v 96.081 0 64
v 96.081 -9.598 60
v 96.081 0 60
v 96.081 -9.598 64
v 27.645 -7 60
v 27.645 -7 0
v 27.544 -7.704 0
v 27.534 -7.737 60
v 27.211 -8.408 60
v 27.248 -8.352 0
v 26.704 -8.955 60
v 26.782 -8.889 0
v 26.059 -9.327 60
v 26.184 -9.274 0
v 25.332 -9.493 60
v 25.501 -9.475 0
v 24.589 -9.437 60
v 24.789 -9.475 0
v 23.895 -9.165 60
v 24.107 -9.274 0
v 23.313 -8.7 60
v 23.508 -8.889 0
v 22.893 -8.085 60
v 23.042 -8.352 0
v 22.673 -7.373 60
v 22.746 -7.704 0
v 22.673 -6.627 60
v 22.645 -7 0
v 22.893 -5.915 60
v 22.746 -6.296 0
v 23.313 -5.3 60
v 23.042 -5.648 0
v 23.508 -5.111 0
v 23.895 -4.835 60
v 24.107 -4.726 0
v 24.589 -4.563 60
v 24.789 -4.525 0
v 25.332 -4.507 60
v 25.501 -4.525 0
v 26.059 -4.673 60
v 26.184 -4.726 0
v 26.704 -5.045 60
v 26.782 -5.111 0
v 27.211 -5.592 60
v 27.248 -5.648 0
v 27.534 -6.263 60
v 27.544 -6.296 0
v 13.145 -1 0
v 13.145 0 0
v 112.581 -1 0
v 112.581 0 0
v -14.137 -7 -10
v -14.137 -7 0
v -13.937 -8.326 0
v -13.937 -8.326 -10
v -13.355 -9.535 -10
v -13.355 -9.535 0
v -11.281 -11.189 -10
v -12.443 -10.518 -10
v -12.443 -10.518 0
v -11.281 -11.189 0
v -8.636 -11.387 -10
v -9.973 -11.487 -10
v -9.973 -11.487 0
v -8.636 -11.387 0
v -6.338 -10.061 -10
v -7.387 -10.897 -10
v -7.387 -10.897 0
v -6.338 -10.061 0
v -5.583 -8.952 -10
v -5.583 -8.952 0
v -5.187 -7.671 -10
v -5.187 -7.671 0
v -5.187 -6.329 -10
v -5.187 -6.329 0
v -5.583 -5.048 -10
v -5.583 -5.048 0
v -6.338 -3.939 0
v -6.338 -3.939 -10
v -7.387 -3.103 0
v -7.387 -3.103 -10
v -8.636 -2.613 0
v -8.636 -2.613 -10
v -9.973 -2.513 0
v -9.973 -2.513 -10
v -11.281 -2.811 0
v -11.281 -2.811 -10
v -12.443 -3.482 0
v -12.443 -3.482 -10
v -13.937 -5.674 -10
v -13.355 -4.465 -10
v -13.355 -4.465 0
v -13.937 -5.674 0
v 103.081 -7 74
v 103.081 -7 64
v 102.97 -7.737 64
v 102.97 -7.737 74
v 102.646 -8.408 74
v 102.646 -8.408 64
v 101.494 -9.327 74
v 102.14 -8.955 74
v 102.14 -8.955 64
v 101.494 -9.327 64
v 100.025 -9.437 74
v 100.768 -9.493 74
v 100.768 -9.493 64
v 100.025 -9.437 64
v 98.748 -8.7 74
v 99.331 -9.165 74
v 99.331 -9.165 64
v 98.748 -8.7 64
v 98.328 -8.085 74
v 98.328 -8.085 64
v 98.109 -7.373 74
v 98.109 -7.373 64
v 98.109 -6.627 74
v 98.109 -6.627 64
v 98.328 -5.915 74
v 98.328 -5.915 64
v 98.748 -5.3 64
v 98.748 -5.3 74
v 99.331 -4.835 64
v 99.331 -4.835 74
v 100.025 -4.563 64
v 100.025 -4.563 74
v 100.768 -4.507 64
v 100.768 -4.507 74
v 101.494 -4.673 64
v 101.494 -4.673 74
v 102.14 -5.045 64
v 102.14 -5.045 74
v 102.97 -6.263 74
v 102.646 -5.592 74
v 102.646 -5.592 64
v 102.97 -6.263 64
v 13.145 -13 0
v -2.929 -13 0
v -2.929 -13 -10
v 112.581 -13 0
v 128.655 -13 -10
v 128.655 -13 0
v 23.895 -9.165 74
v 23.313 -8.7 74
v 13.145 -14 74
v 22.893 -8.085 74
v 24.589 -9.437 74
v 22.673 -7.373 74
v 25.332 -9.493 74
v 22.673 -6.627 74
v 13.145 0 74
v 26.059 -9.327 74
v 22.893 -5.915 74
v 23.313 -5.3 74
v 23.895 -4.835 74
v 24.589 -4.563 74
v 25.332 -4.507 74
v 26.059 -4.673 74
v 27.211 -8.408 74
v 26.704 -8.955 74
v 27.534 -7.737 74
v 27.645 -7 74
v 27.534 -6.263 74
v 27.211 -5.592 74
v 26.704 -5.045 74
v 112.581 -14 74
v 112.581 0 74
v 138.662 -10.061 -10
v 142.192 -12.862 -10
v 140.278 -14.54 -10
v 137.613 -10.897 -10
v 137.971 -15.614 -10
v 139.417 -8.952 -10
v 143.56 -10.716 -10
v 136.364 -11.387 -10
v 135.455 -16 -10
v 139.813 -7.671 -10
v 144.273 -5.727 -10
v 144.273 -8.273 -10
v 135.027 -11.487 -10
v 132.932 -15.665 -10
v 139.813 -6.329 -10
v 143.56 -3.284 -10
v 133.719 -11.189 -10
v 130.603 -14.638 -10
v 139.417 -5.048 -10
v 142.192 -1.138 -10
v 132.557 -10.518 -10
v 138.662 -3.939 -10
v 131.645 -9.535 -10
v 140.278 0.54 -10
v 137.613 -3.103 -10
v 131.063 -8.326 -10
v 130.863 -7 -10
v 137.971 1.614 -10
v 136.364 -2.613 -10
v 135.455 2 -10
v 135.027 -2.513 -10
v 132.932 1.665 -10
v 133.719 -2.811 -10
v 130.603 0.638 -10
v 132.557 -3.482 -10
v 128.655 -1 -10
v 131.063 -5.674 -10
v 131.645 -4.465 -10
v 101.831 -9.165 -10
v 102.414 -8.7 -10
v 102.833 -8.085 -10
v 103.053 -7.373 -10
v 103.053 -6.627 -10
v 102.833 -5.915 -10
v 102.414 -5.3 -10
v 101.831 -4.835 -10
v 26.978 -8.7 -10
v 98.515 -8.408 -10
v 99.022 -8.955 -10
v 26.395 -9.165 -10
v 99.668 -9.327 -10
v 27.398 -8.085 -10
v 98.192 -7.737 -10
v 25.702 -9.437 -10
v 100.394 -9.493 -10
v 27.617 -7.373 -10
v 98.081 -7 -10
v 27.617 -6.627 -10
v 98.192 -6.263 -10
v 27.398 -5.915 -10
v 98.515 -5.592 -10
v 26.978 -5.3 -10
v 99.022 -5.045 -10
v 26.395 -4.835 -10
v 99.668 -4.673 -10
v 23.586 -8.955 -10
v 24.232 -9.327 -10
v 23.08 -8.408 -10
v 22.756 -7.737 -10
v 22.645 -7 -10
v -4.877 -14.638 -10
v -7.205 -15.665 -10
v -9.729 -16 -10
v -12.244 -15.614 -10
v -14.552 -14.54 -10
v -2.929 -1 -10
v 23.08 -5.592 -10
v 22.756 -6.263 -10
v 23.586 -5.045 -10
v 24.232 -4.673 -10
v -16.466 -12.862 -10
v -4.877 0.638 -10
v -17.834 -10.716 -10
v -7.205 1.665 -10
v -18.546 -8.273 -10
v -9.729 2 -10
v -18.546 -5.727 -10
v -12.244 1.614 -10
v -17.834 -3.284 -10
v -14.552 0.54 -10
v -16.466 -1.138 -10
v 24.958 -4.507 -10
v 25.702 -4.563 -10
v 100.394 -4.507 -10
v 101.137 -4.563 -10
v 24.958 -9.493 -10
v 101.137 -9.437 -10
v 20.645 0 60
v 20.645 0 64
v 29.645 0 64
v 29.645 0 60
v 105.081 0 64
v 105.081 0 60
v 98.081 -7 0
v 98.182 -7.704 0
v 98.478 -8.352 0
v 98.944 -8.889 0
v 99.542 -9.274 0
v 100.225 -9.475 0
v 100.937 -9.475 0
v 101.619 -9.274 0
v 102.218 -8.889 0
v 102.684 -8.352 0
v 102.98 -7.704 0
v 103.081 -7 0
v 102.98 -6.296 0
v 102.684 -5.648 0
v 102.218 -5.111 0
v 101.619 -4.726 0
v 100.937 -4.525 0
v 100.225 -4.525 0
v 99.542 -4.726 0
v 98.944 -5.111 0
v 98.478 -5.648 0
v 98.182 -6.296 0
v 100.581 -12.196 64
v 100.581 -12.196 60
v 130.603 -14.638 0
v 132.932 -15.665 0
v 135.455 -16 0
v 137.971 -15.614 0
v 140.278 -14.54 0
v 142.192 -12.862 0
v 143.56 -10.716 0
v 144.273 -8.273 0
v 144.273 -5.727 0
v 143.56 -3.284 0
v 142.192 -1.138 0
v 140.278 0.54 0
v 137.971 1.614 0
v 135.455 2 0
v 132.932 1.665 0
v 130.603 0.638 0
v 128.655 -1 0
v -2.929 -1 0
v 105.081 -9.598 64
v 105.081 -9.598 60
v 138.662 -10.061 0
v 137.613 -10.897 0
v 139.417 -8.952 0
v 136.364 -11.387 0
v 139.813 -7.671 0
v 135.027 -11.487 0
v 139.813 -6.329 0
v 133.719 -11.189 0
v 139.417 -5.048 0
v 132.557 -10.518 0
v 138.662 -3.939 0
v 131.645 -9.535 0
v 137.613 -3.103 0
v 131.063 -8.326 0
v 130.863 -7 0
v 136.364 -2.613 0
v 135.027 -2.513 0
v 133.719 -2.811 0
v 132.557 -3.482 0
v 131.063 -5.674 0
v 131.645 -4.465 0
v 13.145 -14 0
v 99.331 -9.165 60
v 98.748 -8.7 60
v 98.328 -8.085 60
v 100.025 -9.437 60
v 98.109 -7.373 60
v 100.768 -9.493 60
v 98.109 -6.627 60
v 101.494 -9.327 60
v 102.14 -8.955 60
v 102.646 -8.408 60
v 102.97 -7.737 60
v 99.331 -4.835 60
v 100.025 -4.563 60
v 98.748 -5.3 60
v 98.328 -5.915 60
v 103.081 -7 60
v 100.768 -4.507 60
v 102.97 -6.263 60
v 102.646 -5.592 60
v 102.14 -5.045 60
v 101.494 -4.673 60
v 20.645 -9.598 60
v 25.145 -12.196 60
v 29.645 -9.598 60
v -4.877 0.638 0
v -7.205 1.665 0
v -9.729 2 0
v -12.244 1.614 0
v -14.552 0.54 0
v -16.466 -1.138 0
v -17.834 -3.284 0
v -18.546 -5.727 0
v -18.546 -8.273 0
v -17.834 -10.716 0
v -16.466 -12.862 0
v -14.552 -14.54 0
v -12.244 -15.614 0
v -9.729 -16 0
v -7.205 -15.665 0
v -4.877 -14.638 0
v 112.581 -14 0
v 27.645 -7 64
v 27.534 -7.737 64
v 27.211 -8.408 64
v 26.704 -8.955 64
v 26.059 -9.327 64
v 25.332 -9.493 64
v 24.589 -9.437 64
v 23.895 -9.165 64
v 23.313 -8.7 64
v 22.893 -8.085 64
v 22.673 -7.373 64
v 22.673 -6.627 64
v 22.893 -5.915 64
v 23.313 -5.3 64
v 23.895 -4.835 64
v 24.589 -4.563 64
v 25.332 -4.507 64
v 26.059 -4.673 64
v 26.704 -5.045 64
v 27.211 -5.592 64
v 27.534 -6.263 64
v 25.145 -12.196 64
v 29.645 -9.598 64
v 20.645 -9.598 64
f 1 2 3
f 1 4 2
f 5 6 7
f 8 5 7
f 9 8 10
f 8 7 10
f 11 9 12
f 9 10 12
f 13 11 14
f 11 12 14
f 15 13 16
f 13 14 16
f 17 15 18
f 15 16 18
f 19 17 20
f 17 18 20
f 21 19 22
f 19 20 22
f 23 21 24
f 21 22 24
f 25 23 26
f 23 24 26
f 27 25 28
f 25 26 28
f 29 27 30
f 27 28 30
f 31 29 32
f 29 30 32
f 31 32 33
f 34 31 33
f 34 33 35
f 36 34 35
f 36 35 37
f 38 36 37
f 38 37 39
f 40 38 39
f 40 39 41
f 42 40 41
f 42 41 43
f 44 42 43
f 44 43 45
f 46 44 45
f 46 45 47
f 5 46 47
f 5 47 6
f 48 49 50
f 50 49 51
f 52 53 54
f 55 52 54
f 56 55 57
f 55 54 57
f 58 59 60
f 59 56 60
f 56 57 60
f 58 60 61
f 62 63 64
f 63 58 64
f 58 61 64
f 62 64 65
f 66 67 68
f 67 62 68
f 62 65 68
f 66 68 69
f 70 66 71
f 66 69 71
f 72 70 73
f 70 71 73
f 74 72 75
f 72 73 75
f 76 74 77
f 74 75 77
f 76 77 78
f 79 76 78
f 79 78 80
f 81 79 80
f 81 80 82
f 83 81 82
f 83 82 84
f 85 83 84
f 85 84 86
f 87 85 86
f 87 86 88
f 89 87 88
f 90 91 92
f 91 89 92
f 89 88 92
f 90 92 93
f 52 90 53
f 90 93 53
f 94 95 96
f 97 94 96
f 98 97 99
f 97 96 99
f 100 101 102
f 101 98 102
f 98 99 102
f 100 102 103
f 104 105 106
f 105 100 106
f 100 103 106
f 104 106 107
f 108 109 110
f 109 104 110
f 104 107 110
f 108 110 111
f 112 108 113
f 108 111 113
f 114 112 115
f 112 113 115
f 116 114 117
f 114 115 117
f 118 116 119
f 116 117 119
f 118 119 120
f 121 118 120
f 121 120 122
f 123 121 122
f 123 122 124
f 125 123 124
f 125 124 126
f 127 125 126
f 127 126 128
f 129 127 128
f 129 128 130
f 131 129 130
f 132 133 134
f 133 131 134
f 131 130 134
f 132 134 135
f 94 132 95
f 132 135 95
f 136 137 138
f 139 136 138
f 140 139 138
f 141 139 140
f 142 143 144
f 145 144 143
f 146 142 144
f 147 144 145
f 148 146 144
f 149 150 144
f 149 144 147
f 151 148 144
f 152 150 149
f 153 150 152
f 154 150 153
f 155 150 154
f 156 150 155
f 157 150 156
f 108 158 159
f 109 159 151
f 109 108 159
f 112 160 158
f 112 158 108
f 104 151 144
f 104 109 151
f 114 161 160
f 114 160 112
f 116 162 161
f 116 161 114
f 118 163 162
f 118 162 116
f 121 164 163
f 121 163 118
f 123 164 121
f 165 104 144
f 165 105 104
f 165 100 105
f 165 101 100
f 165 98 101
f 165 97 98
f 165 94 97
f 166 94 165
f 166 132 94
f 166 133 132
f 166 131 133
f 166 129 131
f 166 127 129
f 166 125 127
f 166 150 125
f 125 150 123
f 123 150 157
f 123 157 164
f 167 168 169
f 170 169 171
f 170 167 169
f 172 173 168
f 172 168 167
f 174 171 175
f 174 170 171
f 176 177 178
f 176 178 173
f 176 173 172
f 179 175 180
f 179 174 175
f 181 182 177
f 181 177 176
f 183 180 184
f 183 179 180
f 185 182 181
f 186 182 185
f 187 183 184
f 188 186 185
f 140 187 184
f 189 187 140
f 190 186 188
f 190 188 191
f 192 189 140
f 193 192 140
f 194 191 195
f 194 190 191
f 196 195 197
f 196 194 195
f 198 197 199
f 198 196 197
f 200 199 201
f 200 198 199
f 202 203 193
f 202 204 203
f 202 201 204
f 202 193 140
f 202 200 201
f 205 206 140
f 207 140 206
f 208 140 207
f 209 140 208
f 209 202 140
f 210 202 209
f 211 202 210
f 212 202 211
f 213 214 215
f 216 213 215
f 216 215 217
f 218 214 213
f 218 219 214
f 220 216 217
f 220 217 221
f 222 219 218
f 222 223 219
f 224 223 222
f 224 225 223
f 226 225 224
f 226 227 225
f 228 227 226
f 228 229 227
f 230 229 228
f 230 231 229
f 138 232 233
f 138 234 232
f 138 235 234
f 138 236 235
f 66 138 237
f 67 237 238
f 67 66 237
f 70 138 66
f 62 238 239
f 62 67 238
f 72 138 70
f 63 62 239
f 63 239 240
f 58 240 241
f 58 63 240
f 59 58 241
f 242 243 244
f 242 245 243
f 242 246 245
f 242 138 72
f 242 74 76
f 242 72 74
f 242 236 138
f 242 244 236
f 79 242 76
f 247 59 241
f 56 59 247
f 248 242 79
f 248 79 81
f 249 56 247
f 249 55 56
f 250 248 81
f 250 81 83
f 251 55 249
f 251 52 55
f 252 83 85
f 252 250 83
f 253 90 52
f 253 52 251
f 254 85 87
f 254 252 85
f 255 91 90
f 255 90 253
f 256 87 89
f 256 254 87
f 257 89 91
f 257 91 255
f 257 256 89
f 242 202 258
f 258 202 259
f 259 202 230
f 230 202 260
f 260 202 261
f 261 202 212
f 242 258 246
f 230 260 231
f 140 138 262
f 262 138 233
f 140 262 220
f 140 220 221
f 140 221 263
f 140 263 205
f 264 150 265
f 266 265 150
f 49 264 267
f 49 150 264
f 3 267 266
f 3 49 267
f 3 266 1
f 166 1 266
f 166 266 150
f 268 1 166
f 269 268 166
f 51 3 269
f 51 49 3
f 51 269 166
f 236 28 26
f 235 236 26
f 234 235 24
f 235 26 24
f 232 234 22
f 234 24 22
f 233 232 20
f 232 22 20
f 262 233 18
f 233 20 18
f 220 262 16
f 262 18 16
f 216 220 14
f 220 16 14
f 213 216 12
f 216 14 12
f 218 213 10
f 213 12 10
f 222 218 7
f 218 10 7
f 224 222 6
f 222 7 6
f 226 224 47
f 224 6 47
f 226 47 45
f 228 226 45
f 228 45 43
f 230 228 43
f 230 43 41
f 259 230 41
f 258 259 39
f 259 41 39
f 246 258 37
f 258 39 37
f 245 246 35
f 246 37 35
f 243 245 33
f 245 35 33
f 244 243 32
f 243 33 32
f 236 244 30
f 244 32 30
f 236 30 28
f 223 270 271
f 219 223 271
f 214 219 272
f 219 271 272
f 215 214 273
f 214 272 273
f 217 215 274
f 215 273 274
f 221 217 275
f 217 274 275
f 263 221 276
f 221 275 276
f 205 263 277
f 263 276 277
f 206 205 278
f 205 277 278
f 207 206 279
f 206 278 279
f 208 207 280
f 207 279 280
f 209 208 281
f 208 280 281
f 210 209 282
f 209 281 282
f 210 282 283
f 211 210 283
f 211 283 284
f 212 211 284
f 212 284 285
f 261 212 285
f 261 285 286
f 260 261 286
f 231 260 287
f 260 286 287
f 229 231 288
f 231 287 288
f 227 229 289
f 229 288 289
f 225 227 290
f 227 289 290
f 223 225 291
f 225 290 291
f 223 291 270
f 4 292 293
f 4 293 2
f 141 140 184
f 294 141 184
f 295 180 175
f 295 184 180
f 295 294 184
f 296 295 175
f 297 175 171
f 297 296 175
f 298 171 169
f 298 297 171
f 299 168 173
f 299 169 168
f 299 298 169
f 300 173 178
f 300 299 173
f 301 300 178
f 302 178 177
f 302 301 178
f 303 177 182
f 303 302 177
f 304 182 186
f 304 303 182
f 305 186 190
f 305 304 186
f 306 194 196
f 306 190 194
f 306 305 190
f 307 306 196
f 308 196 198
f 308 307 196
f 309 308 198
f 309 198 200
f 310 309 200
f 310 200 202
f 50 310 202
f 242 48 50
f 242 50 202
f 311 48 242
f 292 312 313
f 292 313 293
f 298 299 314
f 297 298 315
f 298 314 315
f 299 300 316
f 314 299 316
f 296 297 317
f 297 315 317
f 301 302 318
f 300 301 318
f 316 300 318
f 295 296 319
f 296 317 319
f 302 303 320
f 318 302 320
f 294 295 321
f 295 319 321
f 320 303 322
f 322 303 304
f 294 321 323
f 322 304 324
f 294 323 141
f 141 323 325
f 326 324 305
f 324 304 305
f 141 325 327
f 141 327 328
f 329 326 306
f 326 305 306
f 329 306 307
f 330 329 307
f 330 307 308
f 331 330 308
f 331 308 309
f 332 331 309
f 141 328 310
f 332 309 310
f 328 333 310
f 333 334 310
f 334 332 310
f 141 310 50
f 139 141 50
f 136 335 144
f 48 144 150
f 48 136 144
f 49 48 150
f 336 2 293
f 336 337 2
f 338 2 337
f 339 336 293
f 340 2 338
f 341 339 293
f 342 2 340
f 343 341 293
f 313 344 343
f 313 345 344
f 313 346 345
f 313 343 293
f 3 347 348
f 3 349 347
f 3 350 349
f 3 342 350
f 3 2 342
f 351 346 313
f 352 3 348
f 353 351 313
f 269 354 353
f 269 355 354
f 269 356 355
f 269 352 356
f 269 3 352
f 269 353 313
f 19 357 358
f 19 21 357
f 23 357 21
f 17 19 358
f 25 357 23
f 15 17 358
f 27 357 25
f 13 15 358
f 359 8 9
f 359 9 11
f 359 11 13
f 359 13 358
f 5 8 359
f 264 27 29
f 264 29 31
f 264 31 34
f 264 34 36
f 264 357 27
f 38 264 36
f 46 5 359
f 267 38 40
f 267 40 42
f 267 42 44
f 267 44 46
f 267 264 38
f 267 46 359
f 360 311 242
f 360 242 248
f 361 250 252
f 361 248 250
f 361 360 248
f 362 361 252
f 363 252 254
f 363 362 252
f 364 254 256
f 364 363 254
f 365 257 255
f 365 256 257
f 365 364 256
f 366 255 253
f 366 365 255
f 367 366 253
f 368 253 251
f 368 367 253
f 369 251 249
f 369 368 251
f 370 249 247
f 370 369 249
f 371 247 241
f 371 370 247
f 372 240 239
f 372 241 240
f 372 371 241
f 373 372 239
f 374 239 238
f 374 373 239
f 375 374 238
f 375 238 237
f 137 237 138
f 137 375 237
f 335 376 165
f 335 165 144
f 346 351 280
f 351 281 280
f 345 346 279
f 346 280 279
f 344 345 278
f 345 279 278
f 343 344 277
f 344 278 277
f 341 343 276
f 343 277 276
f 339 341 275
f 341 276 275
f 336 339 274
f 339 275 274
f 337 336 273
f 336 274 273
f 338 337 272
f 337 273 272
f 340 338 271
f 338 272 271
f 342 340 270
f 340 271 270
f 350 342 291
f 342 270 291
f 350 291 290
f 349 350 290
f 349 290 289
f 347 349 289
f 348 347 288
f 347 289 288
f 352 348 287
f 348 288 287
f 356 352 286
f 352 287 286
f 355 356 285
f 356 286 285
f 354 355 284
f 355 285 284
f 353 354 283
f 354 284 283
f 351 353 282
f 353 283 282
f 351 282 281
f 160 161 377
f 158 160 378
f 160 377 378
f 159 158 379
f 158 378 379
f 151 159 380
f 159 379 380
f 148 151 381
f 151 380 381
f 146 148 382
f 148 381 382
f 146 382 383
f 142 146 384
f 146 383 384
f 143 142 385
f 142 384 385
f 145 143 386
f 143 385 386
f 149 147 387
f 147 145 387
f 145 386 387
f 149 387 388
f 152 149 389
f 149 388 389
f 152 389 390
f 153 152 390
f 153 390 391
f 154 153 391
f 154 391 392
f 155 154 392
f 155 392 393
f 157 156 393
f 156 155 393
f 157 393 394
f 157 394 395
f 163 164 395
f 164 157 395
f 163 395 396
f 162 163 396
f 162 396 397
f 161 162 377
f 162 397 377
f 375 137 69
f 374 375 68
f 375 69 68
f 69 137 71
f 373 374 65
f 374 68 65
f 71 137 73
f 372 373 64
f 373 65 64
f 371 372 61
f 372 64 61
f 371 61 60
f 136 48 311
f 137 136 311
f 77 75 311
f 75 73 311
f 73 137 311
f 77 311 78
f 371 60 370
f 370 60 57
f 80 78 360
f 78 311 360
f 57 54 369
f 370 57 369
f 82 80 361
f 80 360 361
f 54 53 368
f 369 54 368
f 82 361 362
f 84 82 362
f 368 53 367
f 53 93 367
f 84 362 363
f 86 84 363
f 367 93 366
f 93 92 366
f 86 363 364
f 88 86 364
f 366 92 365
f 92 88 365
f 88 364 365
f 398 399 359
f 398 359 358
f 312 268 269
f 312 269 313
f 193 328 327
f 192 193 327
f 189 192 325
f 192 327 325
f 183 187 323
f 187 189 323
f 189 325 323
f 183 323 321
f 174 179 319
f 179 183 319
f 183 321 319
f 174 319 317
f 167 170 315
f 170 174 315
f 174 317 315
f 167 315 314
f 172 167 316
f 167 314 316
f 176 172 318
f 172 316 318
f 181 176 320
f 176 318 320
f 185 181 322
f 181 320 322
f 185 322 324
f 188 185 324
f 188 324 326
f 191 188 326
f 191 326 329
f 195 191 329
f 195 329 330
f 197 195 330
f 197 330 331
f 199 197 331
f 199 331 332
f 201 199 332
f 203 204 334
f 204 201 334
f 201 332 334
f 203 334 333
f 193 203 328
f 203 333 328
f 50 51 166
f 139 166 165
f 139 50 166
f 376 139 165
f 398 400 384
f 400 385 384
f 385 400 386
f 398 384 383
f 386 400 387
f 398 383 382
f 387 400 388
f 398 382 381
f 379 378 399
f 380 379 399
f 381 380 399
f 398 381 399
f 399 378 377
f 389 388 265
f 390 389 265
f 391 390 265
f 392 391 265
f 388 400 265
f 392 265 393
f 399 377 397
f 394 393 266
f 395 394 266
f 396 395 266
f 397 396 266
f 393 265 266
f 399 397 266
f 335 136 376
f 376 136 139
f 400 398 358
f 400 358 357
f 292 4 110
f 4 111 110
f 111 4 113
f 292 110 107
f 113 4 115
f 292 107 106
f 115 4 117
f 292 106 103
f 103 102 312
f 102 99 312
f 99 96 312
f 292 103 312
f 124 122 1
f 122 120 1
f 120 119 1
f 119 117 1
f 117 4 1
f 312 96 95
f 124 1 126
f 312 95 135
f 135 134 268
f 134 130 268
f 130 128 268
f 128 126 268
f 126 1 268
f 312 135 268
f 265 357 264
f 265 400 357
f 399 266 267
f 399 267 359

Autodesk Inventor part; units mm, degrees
ref_plane "YZ Plane" through (0, 0, 0) normal (1, 0, 0) x (0, 1, 0)
ref_plane "XZ Plane" through (0, 0, 0) normal (0, 1, 0) x (-1, 0, 0)
ref_plane "XY Plane" through (0, 0, 0) normal (0, 0, 1) x (1, 0, 0)
sketch "Sketch1" plane through (0, 0, 0) normal (0, 0, 1) x (1, 0, 0)
  circle A0 centre (100.5809, -7) radius 2.5
  circle A1 centre (25.1452, -7) radius 2.5
  line L0 (0, 0) -> (125.7261, 0)
  line L1 (13.1452, 0) -> (112.5809, 0)
  line L2 (112.5809, 0) -> (112.5809, -14)
  line L3 (112.5809, -14) -> (13.1452, -14)
  line L4 (13.1452, -14) -> (13.1452, 0)
  dimension "d0" = 5
  dimension "d1" = 100.5809
  dimension "d2" = 125.7261
  dimension "d3" = 25.1452
  dimension "d4" = 7
  dimension "d5" = 7
  dimension "d8" = 12
  dimension "d9" = 12
  dimension "d10" = 7
  dimension "d23" = 99.4357
extrude "Extrusion1" add sketch "Sketch1" along normal blind 74
ref_plane "Work Plane1" through (0, 0, 64) normal (0, 0, 1) x (1, 0, 0)
sketch "Sketch2" plane through (0, 0, 64) normal (0, 0, 1) x (1, 0, 0)
  circle A0 centre (25.1452, -7) radius 2.5 projected
  circle A1 centre (100.5809, -7) radius 2.5 projected
  line L0 (25.1452, -12.1962) -> (20.6452, -9.5981)
  line L1 (20.6452, -9.5981) -> (20.6452, 0)
  line L2 (29.6452, 0) -> (29.6452, -9.5981)
  line L3 (29.6452, -9.5981) -> (25.1452, -12.1962)
  line L4 (100.5809, -12.1962) -> (96.0809, -9.5981)
  line L5 (96.0809, -9.5981) -> (96.0809, 0)
  line L6 (105.0809, 0) -> (105.0809, -9.5981)
  line L7 (105.0809, -9.5981) -> (100.5809, -12.1962)
  line L8 (13.1452, 0) -> (112.5809, 0) projected
  line L9 (20.6452, 0) -> (29.6452, 0)
  line L10 (96.0809, 0) -> (105.0809, 0)
  point P0 (0, 0)
  dimension "d27" = 9
  dimension "d28" = 9
extrude "Extrusion2" cut sketch "Sketch2" against normal blind 4 contours A0 | L8 L6 L7 L4 L5 | L0 L1 L8 L2 L3
sketch "Sketch3" plane through (0, 0, 0) normal (0, 0, -1) x (-1, 0, 0)
  circle A0 centre (-135.3631, -7) radius 4.5
  circle A1 centre (9.6369, -7) radius 4.5
  arc A2 (-128.6549, -1) -> (-128.6549, -13) centre (-135.3631, -7) ccw
  arc A3 (2.9287, -13) -> (2.9287, -1) centre (9.6369, -7) ccw
  line L0 (-134.0226, -7) -> (-135.886, -7) construction
  line L1 (-135.886, -7) -> (31.817, -7) construction
  line L2 (-112.5809, -14) -> (-13.1452, -14) construction
  line L3 (-13.1452, 0) -> (-112.5809, 0) construction
  line L4 (-128.6549, -1) -> (2.9287, -1)
  line L5 (2.9287, -13) -> (-128.6549, -13)
  circle A4 centre (-100.5809, -7) radius 2.5 projected
  circle A5 centre (-25.1452, -7) radius 2.5 projected
  point P0 (0, 0)
  dimension "d32" = 145
  dimension "d33" = 9
  dimension "d34" = 18
  dimension "d35" = 14
  dimension "d36" = 7
  dimension "d40" = 12
  dimension "d42" = 75.4357
  dimension "d43" = 34.7822
extrude "Extrusion3" add sketch "Sketch3" along normal blind 10
equation "\"d1\" = 0.8 * d2"
equation "\"d3\" = 0.2 * d2"
equation "\"d5\" = d4"
equation "\"d9\" = d8"
equation "\"d28\" = d27"
equation "\"d36\" = 0.5 * d35"
equation "\"d43\" = -0.5 * d42 + 0.5 * d32"
properties part number "license_mount"
